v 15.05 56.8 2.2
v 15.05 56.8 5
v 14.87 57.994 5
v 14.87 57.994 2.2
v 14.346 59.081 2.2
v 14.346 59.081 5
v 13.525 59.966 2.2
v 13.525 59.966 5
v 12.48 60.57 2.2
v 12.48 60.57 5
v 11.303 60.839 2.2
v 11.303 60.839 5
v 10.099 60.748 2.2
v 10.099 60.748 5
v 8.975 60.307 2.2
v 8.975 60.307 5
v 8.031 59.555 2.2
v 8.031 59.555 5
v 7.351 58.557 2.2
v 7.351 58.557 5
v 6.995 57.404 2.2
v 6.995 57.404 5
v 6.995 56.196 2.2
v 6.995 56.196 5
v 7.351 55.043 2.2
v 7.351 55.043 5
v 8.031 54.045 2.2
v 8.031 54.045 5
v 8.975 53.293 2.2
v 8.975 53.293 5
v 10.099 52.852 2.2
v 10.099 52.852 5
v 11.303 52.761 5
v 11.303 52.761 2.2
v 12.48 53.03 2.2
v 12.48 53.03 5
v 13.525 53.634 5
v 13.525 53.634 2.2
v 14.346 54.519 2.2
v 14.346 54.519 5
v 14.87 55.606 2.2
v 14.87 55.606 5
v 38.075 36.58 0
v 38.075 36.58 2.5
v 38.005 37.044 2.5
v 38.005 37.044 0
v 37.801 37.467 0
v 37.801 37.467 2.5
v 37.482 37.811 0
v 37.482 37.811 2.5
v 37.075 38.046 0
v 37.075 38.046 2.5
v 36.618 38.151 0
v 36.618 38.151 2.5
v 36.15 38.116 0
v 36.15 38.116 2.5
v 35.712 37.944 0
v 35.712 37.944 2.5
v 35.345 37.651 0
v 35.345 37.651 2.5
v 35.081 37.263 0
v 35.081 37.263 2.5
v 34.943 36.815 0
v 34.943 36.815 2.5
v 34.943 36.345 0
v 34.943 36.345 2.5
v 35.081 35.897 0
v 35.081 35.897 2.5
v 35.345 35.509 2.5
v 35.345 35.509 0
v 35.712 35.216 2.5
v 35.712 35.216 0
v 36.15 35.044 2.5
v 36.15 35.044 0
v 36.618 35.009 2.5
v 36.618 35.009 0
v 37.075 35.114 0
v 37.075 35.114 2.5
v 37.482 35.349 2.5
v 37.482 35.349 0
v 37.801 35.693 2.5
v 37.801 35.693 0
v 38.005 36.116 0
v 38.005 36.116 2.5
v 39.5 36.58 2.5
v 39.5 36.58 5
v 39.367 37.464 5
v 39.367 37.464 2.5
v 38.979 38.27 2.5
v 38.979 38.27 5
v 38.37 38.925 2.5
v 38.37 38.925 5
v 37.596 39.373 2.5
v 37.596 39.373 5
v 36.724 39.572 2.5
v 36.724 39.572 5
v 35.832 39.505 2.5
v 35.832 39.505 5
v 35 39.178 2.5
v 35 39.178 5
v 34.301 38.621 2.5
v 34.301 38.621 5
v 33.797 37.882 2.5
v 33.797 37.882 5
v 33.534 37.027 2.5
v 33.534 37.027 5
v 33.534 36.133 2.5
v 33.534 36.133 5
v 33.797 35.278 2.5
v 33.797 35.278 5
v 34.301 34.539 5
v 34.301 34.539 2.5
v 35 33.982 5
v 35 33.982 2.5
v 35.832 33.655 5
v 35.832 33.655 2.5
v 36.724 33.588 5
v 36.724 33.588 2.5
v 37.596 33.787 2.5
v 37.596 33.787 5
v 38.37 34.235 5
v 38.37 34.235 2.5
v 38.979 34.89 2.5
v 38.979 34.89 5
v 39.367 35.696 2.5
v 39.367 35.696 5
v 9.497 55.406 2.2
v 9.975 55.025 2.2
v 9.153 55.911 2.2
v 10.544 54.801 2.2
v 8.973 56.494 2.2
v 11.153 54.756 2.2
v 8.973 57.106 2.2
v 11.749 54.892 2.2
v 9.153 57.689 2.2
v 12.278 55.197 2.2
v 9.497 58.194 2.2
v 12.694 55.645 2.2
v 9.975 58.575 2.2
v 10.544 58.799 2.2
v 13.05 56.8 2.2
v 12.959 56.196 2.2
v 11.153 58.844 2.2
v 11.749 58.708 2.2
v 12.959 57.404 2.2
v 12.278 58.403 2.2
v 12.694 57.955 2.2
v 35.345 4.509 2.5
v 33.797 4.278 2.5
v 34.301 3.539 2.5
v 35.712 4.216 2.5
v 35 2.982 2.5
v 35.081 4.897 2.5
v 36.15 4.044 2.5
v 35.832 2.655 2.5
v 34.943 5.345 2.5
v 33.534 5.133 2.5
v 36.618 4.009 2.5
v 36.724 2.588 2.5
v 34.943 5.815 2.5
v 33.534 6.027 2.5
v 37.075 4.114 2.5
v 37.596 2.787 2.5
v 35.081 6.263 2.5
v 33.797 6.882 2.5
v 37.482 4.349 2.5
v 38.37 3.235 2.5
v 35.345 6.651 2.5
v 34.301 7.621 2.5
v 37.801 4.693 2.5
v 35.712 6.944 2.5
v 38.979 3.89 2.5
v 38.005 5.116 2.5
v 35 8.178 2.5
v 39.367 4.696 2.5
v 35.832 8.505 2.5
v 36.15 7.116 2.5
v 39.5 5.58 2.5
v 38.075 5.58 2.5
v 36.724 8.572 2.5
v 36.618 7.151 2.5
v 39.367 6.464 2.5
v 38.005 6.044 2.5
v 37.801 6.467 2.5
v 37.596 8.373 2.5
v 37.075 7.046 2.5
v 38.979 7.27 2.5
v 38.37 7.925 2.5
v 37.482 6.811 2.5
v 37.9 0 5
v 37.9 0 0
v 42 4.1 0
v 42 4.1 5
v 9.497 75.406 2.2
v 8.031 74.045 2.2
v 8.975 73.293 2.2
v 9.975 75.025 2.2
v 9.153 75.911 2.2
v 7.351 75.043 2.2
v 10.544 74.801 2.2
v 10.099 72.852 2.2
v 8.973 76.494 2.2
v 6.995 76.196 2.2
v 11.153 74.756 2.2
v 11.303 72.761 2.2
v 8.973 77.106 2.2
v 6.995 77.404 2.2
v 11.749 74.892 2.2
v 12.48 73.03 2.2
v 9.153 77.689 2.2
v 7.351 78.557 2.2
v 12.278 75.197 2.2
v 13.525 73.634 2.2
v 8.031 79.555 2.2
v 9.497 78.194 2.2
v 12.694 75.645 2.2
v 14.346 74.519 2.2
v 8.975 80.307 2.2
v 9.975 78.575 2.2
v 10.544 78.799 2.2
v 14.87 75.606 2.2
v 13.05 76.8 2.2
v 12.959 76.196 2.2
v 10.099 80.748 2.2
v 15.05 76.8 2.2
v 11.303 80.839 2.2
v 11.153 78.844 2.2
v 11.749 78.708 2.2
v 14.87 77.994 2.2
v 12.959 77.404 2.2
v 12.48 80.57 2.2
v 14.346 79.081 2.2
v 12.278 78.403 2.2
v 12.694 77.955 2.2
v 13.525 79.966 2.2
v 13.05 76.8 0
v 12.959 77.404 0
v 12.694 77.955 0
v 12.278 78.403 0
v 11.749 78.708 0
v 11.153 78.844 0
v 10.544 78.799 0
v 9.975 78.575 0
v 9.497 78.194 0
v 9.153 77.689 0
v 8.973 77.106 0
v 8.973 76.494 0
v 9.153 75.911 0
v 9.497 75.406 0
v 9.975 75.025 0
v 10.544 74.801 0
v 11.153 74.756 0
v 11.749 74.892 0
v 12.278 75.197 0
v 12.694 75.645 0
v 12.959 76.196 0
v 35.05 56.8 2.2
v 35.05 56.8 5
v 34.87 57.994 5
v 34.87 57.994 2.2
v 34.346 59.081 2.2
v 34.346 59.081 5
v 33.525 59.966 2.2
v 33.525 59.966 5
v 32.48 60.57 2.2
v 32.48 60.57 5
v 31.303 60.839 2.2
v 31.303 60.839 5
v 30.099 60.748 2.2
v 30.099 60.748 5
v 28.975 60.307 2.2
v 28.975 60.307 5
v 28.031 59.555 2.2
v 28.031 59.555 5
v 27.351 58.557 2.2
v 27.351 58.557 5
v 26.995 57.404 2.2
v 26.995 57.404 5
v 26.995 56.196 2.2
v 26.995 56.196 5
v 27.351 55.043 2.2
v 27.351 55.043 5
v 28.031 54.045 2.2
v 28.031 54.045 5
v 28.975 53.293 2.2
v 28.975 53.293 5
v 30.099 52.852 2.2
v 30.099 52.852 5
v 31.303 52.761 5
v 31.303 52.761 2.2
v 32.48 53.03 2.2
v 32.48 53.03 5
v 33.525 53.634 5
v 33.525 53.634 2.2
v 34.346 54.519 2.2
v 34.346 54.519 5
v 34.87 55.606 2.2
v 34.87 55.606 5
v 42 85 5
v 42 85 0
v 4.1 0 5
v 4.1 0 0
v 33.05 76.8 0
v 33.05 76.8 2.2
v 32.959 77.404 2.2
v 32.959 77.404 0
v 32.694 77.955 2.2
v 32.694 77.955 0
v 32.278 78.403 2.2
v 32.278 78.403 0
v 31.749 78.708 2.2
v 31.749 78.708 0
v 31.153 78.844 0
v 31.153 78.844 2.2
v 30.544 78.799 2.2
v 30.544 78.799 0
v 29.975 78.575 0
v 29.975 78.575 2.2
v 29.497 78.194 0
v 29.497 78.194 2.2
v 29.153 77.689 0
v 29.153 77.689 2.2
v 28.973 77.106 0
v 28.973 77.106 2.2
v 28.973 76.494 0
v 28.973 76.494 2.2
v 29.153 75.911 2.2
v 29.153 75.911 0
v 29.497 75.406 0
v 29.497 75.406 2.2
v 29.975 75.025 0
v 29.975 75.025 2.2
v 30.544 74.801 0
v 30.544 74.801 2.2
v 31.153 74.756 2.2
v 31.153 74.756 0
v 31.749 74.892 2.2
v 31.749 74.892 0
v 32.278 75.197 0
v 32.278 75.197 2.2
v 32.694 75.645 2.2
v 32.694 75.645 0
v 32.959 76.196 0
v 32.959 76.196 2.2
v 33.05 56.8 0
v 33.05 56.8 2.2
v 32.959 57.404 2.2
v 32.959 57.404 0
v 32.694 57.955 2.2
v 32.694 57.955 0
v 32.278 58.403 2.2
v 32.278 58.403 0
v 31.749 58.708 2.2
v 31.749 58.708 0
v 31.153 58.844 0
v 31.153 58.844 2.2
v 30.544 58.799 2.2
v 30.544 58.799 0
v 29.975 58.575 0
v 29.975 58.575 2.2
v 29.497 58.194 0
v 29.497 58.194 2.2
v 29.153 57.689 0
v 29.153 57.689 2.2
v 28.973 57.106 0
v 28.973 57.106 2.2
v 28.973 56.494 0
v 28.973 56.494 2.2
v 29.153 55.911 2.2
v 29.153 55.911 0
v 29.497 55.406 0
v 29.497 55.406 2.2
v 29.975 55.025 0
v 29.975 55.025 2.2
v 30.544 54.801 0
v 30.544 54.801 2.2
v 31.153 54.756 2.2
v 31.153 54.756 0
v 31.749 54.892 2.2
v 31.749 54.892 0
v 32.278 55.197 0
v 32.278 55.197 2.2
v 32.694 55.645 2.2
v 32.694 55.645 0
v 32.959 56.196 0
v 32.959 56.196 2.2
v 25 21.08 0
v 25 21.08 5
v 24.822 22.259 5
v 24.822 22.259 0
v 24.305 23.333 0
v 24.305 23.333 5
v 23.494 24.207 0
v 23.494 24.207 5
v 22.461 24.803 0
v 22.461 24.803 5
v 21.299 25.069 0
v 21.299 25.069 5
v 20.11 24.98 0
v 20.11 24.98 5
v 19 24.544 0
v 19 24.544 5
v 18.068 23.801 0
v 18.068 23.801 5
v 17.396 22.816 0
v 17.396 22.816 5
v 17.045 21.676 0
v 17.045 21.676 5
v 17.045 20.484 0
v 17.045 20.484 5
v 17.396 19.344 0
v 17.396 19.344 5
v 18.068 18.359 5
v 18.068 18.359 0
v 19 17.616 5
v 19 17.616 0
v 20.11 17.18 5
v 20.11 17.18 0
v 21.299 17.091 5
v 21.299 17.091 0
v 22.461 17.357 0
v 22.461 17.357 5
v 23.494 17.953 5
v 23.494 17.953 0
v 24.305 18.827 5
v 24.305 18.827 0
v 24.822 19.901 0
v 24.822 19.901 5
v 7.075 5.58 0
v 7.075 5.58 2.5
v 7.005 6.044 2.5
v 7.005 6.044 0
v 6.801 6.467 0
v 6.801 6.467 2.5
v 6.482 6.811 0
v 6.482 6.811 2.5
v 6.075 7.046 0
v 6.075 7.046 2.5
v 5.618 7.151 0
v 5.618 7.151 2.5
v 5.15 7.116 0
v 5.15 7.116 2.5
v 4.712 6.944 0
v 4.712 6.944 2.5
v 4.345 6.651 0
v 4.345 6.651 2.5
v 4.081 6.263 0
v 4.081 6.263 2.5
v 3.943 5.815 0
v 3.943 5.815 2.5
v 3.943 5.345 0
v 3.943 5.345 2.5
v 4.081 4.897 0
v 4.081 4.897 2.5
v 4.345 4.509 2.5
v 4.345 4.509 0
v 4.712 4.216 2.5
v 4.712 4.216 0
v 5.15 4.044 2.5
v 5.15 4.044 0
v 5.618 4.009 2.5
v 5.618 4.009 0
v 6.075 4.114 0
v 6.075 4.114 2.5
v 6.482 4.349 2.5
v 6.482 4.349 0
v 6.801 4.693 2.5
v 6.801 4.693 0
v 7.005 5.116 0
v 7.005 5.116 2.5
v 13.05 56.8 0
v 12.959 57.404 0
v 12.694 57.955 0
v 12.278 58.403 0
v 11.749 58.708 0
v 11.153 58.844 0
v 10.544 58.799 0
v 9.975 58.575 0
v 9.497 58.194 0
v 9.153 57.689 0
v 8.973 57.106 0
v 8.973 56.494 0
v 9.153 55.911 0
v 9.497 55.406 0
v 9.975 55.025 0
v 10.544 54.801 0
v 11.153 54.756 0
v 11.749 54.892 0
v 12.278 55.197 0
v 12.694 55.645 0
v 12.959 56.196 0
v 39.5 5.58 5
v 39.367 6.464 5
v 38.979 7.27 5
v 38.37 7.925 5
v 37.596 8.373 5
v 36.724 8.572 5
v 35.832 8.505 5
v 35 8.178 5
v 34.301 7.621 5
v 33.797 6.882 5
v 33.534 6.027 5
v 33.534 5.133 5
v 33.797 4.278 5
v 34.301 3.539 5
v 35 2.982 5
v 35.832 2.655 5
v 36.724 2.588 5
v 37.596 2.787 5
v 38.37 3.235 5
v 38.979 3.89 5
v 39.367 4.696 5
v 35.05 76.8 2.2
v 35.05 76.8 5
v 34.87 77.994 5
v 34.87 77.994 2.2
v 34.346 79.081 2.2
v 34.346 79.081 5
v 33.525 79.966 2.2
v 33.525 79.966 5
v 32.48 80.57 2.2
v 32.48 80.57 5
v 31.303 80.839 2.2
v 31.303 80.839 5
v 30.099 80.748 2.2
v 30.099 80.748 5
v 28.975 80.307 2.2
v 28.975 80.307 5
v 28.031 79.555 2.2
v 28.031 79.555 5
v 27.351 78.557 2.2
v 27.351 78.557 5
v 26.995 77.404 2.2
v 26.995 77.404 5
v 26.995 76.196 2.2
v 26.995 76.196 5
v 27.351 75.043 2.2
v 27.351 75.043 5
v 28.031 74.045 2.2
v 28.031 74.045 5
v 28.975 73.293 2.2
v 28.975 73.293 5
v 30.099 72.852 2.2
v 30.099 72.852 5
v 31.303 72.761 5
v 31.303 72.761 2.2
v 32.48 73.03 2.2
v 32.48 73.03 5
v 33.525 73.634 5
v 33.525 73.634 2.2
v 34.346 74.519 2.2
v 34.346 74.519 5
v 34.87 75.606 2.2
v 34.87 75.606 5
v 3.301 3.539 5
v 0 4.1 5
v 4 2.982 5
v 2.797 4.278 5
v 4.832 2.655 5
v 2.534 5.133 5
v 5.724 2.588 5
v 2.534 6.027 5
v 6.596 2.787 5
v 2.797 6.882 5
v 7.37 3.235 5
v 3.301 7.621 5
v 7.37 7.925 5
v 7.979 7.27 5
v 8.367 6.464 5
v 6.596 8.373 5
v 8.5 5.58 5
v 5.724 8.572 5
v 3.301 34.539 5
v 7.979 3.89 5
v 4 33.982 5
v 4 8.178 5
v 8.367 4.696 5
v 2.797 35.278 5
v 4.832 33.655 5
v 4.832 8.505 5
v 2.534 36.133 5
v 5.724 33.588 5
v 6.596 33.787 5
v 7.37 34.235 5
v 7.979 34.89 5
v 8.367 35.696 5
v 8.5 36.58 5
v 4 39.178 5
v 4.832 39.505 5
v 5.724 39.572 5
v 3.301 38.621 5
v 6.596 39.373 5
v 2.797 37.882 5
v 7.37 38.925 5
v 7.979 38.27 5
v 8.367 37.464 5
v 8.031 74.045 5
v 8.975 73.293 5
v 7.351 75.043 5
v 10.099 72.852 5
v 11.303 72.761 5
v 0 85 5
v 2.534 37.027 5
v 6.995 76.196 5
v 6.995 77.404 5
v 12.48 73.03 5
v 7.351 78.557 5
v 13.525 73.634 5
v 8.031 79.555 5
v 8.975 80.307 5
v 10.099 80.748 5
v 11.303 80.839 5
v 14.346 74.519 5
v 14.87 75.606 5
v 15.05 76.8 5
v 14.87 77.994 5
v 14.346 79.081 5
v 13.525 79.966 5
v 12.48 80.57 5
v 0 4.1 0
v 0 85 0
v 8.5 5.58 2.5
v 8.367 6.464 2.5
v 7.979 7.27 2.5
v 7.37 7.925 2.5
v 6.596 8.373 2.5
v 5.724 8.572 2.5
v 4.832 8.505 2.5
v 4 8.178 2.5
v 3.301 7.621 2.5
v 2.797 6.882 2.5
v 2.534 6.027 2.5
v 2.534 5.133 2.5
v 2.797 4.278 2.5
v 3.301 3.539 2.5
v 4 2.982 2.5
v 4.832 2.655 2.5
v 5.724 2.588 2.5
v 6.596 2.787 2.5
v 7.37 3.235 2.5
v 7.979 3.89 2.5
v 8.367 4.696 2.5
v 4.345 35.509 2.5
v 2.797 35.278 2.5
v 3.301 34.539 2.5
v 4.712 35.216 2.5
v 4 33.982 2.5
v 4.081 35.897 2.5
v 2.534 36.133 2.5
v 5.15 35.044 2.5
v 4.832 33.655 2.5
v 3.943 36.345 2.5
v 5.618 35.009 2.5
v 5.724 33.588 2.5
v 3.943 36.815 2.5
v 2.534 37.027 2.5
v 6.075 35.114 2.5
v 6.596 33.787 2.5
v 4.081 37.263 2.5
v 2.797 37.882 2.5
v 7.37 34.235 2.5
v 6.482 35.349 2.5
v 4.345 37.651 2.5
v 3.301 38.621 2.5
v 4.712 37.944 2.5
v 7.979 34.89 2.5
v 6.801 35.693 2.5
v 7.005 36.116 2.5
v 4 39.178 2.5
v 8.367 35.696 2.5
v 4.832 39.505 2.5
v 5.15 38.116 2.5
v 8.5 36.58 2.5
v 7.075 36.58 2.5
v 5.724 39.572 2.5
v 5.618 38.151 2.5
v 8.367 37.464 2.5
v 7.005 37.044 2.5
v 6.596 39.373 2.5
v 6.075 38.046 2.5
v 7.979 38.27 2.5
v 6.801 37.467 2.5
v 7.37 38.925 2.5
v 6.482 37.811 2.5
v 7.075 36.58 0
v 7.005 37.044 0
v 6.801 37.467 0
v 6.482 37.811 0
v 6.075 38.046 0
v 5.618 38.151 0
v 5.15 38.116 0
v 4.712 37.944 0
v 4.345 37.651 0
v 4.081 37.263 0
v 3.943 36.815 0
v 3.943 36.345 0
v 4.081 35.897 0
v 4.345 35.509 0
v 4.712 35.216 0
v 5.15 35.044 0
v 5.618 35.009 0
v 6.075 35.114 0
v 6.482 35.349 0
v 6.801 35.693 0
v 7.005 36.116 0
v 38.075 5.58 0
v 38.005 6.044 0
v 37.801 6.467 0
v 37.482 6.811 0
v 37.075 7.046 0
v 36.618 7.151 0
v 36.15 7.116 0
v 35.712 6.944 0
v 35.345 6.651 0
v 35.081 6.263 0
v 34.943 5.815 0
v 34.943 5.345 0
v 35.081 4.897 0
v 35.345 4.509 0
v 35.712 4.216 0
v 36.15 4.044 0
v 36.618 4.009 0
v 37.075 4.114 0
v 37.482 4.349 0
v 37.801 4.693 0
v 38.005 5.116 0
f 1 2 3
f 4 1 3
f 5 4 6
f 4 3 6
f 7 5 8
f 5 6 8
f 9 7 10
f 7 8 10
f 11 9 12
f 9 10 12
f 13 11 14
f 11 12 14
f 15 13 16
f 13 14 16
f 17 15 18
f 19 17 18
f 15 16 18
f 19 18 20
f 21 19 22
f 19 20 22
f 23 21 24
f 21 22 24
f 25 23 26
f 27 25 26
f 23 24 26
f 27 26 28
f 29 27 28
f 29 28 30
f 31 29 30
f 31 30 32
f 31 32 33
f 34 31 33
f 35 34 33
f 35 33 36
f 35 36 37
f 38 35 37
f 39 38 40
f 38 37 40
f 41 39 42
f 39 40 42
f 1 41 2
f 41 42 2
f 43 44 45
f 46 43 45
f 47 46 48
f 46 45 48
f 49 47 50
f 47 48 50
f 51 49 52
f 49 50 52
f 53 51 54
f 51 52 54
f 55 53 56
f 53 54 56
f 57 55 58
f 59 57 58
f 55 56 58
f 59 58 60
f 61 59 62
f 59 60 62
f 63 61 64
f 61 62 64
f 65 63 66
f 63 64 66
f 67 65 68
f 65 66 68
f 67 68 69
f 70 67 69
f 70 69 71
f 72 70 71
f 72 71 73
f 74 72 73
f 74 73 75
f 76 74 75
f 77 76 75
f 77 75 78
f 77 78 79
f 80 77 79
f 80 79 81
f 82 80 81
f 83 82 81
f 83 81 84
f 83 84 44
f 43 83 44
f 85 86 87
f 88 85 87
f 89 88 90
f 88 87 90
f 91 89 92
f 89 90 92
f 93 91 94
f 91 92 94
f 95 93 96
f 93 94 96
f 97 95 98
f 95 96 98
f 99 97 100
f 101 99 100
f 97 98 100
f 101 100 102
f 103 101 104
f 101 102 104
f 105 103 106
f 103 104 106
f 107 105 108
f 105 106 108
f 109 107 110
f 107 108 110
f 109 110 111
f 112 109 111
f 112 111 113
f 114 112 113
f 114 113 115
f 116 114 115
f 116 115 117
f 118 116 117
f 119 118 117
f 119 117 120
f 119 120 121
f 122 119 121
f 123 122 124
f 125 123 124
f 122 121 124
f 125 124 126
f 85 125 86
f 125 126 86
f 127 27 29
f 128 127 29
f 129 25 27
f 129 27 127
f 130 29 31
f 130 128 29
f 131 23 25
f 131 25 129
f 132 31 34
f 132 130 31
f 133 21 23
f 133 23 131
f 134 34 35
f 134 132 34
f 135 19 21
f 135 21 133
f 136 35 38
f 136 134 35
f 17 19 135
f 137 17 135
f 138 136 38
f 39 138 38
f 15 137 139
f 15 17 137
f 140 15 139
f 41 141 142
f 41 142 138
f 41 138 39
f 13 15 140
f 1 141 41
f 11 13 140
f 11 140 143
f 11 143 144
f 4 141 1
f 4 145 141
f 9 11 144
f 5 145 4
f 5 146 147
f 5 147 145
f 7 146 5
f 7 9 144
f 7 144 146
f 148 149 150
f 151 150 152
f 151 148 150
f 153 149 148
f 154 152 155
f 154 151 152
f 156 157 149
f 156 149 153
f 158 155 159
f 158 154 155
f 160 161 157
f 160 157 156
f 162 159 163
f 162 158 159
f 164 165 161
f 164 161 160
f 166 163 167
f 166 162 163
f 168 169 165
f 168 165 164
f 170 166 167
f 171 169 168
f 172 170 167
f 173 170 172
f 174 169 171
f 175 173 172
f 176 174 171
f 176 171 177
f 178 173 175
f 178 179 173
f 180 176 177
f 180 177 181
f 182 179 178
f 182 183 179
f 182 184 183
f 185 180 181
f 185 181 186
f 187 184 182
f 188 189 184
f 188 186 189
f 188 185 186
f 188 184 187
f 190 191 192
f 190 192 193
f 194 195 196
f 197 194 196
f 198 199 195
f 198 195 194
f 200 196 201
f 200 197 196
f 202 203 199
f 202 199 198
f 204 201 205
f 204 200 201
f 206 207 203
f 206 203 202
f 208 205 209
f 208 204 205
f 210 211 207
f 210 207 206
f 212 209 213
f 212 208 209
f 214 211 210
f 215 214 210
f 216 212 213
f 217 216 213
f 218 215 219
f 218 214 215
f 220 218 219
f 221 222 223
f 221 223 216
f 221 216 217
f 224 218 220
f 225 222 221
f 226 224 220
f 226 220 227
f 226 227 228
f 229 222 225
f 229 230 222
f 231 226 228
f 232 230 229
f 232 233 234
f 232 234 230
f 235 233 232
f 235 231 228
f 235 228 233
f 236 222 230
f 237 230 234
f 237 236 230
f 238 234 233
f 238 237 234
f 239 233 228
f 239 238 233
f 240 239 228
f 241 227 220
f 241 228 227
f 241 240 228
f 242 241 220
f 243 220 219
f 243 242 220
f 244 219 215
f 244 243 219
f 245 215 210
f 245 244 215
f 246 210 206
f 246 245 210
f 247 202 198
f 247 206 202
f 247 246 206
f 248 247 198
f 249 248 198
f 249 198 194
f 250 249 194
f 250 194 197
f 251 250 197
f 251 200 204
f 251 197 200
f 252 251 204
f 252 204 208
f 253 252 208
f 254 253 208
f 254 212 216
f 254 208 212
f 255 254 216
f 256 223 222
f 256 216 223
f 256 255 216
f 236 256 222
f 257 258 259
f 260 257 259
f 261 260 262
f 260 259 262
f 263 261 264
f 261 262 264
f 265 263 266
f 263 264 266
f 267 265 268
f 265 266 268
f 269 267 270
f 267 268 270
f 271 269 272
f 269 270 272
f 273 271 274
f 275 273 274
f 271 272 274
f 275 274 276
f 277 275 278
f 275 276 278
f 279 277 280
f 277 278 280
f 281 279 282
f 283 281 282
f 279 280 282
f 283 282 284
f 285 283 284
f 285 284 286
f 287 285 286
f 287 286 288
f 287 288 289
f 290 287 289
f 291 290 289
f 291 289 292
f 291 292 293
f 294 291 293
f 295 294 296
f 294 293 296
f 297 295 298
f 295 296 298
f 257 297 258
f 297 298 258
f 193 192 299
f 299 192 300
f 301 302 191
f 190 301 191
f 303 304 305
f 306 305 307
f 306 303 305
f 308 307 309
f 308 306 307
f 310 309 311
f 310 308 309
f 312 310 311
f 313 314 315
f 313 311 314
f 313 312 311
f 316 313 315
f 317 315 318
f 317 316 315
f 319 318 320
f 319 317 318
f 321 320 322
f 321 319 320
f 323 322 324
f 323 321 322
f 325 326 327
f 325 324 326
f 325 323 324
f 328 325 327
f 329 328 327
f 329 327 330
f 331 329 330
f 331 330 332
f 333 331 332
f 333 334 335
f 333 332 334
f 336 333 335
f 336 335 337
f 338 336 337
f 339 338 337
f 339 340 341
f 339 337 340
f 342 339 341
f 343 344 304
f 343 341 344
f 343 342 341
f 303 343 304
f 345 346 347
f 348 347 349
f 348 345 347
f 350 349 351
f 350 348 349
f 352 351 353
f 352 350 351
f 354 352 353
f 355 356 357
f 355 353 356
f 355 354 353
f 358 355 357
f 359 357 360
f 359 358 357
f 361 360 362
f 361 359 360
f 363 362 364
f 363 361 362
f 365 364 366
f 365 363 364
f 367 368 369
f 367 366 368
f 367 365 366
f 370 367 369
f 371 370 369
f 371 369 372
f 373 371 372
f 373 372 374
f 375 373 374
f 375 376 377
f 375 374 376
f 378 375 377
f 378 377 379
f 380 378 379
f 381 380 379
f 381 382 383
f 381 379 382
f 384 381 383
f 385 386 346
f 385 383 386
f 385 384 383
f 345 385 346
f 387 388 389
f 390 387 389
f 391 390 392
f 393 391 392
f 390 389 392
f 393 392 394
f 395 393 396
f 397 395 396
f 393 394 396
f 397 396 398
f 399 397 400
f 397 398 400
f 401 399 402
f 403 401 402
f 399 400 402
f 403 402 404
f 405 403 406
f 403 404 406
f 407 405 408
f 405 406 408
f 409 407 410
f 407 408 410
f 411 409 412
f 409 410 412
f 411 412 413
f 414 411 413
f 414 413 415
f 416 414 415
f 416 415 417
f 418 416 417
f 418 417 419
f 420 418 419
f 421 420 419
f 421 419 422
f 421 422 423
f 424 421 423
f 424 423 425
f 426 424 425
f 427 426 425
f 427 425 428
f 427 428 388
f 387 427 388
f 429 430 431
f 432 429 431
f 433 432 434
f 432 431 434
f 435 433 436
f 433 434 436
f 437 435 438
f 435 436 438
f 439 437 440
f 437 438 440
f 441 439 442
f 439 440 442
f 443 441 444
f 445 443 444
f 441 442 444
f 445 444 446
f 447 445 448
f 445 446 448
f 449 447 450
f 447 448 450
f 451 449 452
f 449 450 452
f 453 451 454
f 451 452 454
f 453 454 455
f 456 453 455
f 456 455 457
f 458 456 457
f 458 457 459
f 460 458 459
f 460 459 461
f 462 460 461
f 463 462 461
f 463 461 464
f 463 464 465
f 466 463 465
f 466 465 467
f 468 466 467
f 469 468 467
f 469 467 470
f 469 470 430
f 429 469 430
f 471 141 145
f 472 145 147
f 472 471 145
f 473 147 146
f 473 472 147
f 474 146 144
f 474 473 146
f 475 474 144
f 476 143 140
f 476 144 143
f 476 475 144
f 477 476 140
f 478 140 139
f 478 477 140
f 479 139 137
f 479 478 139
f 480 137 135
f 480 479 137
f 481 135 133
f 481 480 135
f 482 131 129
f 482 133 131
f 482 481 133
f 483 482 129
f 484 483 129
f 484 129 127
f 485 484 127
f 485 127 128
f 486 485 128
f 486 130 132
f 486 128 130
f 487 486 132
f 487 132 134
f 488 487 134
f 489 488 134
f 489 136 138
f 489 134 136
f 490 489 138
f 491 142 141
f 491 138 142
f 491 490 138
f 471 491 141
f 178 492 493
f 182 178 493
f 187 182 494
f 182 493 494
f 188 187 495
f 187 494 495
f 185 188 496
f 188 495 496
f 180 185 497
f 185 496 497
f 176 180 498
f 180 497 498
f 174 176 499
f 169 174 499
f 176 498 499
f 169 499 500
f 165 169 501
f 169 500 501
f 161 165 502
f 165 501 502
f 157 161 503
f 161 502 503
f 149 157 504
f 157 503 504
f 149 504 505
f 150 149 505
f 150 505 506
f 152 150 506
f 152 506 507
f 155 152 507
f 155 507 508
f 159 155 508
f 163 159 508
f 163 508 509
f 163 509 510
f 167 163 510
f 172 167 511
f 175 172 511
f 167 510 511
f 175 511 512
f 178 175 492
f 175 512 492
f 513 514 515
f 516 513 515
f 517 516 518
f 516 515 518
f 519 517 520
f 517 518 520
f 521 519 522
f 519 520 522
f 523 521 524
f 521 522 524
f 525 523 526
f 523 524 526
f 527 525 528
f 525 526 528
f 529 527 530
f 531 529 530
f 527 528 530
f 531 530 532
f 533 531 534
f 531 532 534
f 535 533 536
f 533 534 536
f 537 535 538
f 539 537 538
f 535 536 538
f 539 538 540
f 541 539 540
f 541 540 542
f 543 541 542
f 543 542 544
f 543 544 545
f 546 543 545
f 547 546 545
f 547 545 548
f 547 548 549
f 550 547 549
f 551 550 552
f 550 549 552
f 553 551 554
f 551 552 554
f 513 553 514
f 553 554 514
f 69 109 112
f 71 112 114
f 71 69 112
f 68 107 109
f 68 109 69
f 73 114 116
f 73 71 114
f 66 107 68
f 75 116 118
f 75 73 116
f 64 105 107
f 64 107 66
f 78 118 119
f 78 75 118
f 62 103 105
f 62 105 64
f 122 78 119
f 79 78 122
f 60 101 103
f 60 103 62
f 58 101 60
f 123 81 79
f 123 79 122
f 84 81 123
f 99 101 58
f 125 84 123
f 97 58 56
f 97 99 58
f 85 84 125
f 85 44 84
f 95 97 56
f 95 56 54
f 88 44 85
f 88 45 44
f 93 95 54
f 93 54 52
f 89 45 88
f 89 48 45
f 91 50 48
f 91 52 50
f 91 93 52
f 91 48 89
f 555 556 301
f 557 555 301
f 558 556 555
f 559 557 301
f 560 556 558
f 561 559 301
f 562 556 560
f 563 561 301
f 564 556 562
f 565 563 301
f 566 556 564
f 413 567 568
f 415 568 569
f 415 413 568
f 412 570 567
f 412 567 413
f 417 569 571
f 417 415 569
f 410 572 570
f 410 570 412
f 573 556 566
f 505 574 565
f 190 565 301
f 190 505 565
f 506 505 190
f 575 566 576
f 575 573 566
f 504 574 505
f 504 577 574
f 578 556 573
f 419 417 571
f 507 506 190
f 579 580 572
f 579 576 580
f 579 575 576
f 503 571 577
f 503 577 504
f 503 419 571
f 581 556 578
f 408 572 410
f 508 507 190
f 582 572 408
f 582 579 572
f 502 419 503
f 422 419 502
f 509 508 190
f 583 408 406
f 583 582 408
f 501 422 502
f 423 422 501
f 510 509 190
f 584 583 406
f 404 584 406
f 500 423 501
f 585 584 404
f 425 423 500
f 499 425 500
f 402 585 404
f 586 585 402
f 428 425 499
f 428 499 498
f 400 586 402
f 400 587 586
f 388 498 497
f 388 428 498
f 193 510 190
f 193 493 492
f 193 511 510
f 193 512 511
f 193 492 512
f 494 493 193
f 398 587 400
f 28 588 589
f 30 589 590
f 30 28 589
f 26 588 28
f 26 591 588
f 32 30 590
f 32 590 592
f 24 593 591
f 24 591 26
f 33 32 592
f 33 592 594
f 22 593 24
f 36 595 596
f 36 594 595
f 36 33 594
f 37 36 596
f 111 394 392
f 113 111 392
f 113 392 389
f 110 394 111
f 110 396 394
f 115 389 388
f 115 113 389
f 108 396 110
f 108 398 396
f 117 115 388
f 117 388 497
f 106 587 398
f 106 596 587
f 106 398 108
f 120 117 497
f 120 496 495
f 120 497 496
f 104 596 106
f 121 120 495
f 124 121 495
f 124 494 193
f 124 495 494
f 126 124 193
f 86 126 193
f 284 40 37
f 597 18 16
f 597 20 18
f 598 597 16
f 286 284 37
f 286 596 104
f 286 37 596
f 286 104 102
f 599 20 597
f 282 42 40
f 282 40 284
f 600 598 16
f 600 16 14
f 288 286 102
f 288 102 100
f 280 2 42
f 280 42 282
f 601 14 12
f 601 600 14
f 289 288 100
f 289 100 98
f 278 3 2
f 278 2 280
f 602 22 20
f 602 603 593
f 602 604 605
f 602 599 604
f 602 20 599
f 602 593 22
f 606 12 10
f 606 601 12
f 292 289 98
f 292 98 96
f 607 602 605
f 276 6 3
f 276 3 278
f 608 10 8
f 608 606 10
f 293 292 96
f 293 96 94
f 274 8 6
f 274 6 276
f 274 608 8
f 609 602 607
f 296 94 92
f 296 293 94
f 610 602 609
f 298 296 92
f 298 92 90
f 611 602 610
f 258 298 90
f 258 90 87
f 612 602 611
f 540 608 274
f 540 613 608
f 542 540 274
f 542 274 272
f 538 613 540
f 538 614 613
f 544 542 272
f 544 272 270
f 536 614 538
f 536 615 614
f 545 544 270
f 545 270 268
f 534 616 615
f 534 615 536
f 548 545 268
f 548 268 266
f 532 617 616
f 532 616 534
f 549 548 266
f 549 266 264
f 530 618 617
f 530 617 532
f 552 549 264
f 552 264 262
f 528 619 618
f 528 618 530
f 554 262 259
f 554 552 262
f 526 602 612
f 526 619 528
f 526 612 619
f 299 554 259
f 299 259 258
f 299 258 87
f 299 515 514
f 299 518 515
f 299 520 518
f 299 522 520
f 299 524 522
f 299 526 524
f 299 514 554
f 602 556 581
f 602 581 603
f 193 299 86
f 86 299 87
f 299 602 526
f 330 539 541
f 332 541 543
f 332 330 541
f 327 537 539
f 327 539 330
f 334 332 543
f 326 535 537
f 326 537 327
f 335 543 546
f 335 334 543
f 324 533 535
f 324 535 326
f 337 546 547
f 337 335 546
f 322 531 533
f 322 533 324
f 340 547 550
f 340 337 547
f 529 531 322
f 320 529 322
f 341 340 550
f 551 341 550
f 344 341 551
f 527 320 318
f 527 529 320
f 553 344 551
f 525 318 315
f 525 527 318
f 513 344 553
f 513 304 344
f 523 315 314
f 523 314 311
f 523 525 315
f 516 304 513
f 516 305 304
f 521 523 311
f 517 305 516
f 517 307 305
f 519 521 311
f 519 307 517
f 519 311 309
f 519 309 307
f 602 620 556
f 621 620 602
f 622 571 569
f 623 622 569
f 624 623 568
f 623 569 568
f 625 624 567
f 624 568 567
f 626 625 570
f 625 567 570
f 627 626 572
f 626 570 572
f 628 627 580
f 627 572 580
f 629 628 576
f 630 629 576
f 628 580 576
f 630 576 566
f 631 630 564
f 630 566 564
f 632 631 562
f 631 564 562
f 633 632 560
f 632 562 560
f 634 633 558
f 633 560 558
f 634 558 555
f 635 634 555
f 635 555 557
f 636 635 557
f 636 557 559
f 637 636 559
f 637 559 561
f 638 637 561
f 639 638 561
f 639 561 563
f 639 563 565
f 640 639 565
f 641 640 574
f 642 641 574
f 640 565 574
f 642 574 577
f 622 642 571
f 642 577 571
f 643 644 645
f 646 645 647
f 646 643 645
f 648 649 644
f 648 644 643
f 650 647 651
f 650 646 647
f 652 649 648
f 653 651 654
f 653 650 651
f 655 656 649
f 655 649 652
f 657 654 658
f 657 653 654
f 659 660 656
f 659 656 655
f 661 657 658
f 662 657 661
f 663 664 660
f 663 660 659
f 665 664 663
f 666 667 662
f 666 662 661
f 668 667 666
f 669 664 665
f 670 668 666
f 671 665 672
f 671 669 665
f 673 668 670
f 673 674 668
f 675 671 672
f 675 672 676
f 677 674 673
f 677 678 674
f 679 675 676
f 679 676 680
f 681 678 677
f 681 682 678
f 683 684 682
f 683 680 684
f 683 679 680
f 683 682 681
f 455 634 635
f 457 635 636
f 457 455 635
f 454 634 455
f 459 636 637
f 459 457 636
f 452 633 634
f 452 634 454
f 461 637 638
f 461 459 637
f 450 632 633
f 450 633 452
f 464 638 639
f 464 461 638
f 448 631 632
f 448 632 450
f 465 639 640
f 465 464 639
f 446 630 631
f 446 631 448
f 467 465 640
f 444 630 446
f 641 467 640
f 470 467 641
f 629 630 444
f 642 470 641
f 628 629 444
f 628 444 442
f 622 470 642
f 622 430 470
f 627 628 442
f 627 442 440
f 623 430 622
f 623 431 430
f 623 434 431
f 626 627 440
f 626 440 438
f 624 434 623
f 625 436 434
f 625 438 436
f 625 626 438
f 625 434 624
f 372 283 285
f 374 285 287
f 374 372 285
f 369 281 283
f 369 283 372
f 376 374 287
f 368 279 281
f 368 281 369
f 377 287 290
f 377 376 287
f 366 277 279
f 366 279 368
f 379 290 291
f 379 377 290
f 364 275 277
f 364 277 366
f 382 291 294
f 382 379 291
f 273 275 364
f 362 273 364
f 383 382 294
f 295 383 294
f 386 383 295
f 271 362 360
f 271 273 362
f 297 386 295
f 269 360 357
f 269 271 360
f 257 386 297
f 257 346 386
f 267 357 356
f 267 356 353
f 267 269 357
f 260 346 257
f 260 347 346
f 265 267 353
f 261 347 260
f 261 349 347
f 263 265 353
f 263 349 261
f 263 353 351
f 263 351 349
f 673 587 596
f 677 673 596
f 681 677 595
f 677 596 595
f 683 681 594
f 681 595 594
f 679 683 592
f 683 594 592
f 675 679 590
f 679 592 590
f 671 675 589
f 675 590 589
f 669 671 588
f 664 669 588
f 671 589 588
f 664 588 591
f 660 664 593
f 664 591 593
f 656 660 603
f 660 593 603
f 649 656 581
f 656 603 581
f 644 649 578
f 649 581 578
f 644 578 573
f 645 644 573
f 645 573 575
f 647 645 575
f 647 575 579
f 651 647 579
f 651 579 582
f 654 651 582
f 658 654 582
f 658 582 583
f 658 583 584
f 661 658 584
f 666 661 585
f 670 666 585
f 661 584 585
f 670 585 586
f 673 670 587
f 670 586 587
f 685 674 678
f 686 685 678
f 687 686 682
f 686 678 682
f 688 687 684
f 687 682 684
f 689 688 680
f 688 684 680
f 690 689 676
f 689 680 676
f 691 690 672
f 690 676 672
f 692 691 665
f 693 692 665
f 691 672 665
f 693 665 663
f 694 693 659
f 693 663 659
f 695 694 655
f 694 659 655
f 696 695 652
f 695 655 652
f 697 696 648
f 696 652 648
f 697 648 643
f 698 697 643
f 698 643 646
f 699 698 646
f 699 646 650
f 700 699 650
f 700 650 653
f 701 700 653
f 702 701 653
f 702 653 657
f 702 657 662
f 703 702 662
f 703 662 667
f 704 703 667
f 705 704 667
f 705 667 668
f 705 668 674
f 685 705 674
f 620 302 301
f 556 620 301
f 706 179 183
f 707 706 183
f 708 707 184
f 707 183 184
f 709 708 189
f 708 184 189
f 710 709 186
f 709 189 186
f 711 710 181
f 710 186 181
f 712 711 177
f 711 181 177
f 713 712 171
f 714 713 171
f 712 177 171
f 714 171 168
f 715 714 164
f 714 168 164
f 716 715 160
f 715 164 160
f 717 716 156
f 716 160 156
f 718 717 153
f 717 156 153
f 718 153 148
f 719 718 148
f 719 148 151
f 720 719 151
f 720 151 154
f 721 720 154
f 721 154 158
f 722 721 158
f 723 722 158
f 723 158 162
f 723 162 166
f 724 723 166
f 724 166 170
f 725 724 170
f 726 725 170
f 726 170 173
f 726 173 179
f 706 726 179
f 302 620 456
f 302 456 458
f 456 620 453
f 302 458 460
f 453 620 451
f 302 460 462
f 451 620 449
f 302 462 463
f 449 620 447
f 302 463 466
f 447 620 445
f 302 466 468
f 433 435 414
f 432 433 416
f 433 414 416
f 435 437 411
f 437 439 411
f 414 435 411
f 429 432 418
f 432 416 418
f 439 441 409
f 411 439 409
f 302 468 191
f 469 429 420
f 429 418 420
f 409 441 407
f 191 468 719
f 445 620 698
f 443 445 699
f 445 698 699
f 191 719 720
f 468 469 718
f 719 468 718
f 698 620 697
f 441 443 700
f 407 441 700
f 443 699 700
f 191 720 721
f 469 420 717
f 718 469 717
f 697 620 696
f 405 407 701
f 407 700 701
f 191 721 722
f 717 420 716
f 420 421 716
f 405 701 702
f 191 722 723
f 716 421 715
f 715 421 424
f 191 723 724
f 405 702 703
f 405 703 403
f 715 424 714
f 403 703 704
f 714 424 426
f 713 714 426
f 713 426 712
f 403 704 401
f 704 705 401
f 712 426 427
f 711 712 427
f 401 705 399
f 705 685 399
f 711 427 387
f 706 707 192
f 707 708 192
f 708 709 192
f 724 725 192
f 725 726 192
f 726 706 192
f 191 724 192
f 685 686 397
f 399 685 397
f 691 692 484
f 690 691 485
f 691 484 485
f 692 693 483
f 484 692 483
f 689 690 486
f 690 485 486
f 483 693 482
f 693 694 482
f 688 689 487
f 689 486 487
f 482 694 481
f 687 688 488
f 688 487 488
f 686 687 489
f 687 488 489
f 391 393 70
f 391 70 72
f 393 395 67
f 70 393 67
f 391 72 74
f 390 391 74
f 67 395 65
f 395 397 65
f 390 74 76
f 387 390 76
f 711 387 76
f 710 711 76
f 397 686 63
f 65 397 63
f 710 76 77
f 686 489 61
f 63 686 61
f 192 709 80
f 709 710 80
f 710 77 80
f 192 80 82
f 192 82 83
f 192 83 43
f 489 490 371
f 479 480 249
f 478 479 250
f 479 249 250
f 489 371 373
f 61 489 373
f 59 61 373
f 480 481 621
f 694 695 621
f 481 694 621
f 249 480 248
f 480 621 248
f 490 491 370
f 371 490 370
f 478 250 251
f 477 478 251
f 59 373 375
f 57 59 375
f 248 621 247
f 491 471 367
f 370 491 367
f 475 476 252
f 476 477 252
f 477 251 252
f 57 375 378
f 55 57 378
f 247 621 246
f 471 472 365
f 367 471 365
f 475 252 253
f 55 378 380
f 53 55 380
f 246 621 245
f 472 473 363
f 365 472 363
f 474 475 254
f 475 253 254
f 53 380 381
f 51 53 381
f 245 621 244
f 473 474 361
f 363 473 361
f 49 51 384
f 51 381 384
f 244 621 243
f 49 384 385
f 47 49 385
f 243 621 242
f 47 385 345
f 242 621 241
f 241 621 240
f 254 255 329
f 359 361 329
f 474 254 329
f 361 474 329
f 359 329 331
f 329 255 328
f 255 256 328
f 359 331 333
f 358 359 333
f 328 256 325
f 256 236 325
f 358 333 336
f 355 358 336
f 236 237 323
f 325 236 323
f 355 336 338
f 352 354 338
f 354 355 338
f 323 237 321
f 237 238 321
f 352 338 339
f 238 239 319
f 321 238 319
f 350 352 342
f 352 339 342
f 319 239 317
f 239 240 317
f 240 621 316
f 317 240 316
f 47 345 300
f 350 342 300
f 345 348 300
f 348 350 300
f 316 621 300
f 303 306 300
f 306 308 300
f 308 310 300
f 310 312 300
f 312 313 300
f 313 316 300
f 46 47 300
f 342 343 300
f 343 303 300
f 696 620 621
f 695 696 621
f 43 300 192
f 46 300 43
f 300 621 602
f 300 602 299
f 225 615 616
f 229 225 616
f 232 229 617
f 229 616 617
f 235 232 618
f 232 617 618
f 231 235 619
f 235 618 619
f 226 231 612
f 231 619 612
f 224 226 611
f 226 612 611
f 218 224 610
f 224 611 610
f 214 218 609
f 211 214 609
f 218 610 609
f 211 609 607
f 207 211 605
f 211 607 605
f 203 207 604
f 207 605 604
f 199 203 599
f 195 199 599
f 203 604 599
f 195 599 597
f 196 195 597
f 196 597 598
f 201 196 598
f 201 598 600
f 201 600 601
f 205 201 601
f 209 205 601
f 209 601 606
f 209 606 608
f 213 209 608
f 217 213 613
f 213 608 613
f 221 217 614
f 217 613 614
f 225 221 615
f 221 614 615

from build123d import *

# Parameters (mm, degrees)
CROQUIS1_W              = 42
CROQUIS1_H              = 85
CROQUIS1_R              = 2.05
SALIENTE_EXTRUIR1_DEPTH = 5
CROQUIS4_R              = 4.05
CORTAR_EXTRUIR1_DEPTH   = 2.8
CROQUIS5_R              = 1.575
CROQUIS5_R_2            = 4
CORTAR_EXTRUIR2_DEPTH   = 6
CROQUIS6_R              = 3
CORTAR_EXTRUIR3_DEPTH   = 2.5
CHAFL_N1_SIZE           = 4.1


with BuildPart() as part:
    # Croquis1 → Saliente-Extruir1 (new body)
    with BuildSketch(Plane.XY):
        with Locations((21, 42.5)):
            Rectangle(CROQUIS1_W, CROQUIS1_H)
        with Locations((11, 76.8)):
            Circle(CROQUIS1_R, mode=Mode.SUBTRACT)
        with Locations((31, 76.8)):
            Circle(CROQUIS1_R, mode=Mode.SUBTRACT)
        with Locations((31, 56.8)):
            Circle(CROQUIS1_R, mode=Mode.SUBTRACT)
        with Locations((11, 56.8)):
            Circle(CROQUIS1_R, mode=Mode.SUBTRACT)
    extrude(amount=SALIENTE_EXTRUIR1_DEPTH)

    # Croquis4 → Cortar-Extruir1 (cut)
    with BuildSketch(Plane.XY.offset(5)):
        with Locations((11, 76.8)):
            Circle(CROQUIS4_R)
        with Locations((11, 56.8)):
            Circle(CROQUIS4_R)
        with Locations((31, 56.8)):
            Circle(CROQUIS4_R)
        with Locations((31, 76.8)):
            Circle(CROQUIS4_R)
    extrude(amount=-CORTAR_EXTRUIR1_DEPTH, mode=Mode.SUBTRACT)

    # Croquis5 → Cortar-Extruir2 (cut, through all)
    with BuildSketch(Plane.XY.offset(5)):
        with Locations((5.5, 36.58)):
            Circle(CROQUIS5_R)
        with Locations((36.5, 36.58)):
            Circle(CROQUIS5_R)
        with Locations((36.5, 5.58)):
            Circle(CROQUIS5_R)
        with Locations((5.5, 5.58)):
            Circle(CROQUIS5_R)
        with Locations((21, 21.08)):
            Circle(CROQUIS5_R_2)
    extrude(amount=-CORTAR_EXTRUIR2_DEPTH, mode=Mode.SUBTRACT)

    # Croquis6 → Cortar-Extruir3 (cut)
    with BuildSketch(Plane.XY.offset(5)):
        with Locations((5.5, 36.58)):
            Circle(CROQUIS6_R)
        with Locations((36.5, 36.58)):
            Circle(CROQUIS6_R)
        with Locations((36.5, 5.58)):
            Circle(CROQUIS6_R)
        with Locations((5.5, 5.58)):
            Circle(CROQUIS6_R)
    extrude(amount=-CORTAR_EXTRUIR3_DEPTH, mode=Mode.SUBTRACT)

    # Chaflán1
    chafl_n1_edges = [part.edges().sort_by_distance(p)[0] for p in [
        (42, 0, 2.5),
        (0, 0, 2.5),
    ]]
    chamfer(chafl_n1_edges, length=CHAFL_N1_SIZE)


solid = part.part
